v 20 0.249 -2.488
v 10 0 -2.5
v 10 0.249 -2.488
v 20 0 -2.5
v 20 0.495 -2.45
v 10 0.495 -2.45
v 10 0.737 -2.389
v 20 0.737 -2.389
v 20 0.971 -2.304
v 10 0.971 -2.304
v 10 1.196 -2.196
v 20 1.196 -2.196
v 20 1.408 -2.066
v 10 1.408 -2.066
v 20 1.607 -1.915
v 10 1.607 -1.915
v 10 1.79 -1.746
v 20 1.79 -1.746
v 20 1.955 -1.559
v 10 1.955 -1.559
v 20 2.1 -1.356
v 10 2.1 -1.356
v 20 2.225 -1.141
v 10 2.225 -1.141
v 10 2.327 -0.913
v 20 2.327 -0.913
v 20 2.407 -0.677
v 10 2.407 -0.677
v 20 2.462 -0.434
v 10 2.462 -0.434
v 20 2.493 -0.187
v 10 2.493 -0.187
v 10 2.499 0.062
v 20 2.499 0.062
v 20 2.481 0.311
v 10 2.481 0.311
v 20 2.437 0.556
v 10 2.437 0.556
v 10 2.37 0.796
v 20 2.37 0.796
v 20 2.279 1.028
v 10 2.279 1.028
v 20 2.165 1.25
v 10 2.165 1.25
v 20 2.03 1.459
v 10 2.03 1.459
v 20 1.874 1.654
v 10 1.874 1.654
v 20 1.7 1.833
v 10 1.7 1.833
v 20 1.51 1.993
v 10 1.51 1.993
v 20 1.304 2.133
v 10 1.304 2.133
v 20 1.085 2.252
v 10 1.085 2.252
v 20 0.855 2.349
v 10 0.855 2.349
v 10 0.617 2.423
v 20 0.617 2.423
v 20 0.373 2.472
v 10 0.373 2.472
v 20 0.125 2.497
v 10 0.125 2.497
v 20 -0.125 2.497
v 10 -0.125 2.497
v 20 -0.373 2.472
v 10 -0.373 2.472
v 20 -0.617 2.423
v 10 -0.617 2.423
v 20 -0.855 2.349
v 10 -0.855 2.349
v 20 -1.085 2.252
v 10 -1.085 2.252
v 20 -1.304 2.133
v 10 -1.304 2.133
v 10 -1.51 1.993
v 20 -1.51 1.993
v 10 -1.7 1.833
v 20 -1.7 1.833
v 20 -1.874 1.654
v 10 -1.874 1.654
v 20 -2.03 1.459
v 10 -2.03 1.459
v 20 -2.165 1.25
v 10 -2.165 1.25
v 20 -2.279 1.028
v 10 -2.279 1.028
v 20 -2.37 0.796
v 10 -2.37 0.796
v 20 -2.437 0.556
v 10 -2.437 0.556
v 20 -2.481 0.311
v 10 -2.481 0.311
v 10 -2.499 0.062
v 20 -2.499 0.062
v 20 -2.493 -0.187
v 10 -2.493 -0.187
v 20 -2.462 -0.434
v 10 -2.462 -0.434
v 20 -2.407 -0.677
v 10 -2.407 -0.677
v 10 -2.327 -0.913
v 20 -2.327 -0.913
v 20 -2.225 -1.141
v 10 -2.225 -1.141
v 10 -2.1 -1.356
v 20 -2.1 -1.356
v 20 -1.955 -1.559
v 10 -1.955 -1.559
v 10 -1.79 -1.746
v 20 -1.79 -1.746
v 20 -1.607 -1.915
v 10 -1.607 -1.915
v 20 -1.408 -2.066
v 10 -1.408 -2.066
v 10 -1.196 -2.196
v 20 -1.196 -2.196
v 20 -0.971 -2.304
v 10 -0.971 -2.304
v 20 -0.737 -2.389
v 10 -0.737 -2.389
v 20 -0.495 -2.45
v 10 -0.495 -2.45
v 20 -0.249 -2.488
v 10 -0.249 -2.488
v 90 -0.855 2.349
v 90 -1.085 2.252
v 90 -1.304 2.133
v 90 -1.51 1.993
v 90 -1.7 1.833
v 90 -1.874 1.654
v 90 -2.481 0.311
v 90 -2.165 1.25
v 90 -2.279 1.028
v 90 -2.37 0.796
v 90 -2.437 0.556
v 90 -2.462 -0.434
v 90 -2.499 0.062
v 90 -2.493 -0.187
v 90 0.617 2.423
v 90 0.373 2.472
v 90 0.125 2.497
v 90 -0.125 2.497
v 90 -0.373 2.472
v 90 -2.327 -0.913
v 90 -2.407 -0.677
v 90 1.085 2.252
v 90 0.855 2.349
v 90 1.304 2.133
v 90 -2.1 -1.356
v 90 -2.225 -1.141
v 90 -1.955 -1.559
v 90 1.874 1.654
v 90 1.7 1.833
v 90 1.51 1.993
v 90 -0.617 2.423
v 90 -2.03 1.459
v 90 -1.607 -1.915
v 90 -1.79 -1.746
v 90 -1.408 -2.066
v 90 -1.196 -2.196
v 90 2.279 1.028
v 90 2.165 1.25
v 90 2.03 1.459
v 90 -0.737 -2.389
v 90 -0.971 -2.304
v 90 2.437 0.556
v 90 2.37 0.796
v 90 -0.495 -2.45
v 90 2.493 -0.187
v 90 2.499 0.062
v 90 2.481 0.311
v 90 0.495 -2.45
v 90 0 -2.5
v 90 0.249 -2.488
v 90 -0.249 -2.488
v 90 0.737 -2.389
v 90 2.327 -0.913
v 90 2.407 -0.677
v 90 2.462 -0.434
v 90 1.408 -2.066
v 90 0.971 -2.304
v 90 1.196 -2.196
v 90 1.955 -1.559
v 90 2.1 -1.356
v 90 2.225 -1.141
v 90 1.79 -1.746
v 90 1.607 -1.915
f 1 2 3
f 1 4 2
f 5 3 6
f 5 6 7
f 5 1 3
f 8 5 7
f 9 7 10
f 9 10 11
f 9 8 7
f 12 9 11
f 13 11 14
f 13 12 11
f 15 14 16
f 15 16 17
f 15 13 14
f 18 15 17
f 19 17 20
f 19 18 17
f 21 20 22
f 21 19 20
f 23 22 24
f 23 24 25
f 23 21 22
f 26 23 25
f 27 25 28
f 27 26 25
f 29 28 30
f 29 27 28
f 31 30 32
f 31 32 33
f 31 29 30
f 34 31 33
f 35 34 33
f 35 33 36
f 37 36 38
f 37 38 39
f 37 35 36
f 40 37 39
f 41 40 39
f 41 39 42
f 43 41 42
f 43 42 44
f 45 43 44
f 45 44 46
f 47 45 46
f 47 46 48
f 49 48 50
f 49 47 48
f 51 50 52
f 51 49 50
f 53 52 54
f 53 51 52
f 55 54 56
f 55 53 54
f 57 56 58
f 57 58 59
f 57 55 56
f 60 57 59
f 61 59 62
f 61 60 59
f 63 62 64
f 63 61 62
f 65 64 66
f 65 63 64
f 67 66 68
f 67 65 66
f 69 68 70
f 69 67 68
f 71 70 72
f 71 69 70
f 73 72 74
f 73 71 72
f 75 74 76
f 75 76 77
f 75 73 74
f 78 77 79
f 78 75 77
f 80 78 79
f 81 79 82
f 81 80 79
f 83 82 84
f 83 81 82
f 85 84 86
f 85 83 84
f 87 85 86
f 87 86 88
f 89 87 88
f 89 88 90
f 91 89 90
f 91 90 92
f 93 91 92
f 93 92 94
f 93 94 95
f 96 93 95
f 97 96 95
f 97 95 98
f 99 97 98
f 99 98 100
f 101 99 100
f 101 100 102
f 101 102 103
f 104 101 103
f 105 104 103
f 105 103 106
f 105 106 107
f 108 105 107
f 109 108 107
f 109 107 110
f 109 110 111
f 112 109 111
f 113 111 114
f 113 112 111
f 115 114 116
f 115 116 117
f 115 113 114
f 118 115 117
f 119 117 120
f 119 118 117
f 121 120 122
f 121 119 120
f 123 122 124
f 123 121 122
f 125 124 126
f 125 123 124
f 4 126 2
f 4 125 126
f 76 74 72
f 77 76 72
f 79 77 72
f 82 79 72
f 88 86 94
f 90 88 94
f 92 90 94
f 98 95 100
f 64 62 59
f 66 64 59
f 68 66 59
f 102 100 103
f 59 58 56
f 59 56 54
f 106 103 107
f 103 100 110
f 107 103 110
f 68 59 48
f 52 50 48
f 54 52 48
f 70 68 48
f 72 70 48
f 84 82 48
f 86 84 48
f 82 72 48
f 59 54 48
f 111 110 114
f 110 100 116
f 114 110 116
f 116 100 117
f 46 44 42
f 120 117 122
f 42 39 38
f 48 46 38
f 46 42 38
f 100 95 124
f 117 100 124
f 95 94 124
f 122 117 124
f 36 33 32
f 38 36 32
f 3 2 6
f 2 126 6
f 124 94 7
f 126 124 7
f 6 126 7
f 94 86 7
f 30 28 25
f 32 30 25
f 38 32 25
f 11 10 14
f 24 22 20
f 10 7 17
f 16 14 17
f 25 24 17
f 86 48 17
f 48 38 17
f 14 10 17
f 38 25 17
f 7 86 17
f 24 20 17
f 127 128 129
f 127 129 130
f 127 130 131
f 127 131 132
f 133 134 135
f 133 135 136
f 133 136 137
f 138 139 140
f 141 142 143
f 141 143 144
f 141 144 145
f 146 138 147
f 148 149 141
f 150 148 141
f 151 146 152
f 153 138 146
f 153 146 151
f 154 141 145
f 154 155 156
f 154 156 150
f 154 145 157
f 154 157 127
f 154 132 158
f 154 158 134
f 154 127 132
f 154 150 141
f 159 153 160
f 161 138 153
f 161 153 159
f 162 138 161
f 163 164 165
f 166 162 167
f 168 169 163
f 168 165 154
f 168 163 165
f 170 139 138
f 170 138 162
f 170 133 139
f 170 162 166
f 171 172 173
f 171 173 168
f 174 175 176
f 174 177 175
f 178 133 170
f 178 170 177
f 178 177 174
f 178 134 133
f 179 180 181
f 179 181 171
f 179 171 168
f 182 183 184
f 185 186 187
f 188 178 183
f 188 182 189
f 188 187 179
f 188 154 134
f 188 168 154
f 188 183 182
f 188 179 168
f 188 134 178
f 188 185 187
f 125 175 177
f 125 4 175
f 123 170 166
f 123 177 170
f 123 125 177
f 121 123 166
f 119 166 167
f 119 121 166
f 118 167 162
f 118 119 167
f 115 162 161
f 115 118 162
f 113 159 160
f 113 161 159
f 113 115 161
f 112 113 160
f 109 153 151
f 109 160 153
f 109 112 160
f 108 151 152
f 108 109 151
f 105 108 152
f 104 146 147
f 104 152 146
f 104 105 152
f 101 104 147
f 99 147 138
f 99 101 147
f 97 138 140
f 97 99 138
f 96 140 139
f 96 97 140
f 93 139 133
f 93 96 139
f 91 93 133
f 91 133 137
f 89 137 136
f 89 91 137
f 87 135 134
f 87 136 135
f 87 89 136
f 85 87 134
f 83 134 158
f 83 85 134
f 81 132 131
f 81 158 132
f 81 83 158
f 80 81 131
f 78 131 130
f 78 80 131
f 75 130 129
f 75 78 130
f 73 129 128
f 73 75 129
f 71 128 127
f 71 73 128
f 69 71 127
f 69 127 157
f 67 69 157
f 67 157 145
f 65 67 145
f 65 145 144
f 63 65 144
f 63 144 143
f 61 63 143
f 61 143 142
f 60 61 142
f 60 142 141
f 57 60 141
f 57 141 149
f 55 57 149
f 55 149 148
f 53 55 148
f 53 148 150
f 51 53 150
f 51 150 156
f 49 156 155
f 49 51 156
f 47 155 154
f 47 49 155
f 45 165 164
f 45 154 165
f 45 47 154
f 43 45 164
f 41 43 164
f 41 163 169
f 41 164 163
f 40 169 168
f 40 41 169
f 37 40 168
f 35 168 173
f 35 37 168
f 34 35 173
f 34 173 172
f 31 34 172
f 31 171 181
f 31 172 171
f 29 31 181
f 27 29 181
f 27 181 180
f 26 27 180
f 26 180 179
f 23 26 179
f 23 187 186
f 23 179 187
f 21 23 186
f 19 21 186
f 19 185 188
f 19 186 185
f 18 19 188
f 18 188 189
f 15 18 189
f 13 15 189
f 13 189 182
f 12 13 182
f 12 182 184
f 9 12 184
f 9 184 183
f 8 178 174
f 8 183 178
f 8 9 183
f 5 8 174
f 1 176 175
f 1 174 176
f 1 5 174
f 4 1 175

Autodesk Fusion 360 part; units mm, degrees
sketch "Sketch1" plane through (0, 0, 0) normal (0, 0, 1) x (1, 0, 0)
sketch "Sketch2" plane through (0, 0, 0) normal (1, 0, 0) x (0, 0, -1)
  circle A0 centre (0, 0) radius 2.5
  dimension "d1" = 5
extrude "Extrude1" add sketch "Sketch2" along normal blind 70
extrude "Extrude2" add 1 faces at (70, 0.2321, 0.8863) along direction (1, 0, 0) blind 20
extrude "Extrude3" cut 1 faces at (0, 0.2321, 0.8863) along direction (1, 0, 0) blind 10
extrude "Extrude4" cut 1 faces at (10, 0.2321, 0.8863) along direction (1, 0, 0) blind 10
extrude "Extrude5" add 1 faces at (20, 0.2321, 0.8863) along direction (-1, 0, 0) blind 10
